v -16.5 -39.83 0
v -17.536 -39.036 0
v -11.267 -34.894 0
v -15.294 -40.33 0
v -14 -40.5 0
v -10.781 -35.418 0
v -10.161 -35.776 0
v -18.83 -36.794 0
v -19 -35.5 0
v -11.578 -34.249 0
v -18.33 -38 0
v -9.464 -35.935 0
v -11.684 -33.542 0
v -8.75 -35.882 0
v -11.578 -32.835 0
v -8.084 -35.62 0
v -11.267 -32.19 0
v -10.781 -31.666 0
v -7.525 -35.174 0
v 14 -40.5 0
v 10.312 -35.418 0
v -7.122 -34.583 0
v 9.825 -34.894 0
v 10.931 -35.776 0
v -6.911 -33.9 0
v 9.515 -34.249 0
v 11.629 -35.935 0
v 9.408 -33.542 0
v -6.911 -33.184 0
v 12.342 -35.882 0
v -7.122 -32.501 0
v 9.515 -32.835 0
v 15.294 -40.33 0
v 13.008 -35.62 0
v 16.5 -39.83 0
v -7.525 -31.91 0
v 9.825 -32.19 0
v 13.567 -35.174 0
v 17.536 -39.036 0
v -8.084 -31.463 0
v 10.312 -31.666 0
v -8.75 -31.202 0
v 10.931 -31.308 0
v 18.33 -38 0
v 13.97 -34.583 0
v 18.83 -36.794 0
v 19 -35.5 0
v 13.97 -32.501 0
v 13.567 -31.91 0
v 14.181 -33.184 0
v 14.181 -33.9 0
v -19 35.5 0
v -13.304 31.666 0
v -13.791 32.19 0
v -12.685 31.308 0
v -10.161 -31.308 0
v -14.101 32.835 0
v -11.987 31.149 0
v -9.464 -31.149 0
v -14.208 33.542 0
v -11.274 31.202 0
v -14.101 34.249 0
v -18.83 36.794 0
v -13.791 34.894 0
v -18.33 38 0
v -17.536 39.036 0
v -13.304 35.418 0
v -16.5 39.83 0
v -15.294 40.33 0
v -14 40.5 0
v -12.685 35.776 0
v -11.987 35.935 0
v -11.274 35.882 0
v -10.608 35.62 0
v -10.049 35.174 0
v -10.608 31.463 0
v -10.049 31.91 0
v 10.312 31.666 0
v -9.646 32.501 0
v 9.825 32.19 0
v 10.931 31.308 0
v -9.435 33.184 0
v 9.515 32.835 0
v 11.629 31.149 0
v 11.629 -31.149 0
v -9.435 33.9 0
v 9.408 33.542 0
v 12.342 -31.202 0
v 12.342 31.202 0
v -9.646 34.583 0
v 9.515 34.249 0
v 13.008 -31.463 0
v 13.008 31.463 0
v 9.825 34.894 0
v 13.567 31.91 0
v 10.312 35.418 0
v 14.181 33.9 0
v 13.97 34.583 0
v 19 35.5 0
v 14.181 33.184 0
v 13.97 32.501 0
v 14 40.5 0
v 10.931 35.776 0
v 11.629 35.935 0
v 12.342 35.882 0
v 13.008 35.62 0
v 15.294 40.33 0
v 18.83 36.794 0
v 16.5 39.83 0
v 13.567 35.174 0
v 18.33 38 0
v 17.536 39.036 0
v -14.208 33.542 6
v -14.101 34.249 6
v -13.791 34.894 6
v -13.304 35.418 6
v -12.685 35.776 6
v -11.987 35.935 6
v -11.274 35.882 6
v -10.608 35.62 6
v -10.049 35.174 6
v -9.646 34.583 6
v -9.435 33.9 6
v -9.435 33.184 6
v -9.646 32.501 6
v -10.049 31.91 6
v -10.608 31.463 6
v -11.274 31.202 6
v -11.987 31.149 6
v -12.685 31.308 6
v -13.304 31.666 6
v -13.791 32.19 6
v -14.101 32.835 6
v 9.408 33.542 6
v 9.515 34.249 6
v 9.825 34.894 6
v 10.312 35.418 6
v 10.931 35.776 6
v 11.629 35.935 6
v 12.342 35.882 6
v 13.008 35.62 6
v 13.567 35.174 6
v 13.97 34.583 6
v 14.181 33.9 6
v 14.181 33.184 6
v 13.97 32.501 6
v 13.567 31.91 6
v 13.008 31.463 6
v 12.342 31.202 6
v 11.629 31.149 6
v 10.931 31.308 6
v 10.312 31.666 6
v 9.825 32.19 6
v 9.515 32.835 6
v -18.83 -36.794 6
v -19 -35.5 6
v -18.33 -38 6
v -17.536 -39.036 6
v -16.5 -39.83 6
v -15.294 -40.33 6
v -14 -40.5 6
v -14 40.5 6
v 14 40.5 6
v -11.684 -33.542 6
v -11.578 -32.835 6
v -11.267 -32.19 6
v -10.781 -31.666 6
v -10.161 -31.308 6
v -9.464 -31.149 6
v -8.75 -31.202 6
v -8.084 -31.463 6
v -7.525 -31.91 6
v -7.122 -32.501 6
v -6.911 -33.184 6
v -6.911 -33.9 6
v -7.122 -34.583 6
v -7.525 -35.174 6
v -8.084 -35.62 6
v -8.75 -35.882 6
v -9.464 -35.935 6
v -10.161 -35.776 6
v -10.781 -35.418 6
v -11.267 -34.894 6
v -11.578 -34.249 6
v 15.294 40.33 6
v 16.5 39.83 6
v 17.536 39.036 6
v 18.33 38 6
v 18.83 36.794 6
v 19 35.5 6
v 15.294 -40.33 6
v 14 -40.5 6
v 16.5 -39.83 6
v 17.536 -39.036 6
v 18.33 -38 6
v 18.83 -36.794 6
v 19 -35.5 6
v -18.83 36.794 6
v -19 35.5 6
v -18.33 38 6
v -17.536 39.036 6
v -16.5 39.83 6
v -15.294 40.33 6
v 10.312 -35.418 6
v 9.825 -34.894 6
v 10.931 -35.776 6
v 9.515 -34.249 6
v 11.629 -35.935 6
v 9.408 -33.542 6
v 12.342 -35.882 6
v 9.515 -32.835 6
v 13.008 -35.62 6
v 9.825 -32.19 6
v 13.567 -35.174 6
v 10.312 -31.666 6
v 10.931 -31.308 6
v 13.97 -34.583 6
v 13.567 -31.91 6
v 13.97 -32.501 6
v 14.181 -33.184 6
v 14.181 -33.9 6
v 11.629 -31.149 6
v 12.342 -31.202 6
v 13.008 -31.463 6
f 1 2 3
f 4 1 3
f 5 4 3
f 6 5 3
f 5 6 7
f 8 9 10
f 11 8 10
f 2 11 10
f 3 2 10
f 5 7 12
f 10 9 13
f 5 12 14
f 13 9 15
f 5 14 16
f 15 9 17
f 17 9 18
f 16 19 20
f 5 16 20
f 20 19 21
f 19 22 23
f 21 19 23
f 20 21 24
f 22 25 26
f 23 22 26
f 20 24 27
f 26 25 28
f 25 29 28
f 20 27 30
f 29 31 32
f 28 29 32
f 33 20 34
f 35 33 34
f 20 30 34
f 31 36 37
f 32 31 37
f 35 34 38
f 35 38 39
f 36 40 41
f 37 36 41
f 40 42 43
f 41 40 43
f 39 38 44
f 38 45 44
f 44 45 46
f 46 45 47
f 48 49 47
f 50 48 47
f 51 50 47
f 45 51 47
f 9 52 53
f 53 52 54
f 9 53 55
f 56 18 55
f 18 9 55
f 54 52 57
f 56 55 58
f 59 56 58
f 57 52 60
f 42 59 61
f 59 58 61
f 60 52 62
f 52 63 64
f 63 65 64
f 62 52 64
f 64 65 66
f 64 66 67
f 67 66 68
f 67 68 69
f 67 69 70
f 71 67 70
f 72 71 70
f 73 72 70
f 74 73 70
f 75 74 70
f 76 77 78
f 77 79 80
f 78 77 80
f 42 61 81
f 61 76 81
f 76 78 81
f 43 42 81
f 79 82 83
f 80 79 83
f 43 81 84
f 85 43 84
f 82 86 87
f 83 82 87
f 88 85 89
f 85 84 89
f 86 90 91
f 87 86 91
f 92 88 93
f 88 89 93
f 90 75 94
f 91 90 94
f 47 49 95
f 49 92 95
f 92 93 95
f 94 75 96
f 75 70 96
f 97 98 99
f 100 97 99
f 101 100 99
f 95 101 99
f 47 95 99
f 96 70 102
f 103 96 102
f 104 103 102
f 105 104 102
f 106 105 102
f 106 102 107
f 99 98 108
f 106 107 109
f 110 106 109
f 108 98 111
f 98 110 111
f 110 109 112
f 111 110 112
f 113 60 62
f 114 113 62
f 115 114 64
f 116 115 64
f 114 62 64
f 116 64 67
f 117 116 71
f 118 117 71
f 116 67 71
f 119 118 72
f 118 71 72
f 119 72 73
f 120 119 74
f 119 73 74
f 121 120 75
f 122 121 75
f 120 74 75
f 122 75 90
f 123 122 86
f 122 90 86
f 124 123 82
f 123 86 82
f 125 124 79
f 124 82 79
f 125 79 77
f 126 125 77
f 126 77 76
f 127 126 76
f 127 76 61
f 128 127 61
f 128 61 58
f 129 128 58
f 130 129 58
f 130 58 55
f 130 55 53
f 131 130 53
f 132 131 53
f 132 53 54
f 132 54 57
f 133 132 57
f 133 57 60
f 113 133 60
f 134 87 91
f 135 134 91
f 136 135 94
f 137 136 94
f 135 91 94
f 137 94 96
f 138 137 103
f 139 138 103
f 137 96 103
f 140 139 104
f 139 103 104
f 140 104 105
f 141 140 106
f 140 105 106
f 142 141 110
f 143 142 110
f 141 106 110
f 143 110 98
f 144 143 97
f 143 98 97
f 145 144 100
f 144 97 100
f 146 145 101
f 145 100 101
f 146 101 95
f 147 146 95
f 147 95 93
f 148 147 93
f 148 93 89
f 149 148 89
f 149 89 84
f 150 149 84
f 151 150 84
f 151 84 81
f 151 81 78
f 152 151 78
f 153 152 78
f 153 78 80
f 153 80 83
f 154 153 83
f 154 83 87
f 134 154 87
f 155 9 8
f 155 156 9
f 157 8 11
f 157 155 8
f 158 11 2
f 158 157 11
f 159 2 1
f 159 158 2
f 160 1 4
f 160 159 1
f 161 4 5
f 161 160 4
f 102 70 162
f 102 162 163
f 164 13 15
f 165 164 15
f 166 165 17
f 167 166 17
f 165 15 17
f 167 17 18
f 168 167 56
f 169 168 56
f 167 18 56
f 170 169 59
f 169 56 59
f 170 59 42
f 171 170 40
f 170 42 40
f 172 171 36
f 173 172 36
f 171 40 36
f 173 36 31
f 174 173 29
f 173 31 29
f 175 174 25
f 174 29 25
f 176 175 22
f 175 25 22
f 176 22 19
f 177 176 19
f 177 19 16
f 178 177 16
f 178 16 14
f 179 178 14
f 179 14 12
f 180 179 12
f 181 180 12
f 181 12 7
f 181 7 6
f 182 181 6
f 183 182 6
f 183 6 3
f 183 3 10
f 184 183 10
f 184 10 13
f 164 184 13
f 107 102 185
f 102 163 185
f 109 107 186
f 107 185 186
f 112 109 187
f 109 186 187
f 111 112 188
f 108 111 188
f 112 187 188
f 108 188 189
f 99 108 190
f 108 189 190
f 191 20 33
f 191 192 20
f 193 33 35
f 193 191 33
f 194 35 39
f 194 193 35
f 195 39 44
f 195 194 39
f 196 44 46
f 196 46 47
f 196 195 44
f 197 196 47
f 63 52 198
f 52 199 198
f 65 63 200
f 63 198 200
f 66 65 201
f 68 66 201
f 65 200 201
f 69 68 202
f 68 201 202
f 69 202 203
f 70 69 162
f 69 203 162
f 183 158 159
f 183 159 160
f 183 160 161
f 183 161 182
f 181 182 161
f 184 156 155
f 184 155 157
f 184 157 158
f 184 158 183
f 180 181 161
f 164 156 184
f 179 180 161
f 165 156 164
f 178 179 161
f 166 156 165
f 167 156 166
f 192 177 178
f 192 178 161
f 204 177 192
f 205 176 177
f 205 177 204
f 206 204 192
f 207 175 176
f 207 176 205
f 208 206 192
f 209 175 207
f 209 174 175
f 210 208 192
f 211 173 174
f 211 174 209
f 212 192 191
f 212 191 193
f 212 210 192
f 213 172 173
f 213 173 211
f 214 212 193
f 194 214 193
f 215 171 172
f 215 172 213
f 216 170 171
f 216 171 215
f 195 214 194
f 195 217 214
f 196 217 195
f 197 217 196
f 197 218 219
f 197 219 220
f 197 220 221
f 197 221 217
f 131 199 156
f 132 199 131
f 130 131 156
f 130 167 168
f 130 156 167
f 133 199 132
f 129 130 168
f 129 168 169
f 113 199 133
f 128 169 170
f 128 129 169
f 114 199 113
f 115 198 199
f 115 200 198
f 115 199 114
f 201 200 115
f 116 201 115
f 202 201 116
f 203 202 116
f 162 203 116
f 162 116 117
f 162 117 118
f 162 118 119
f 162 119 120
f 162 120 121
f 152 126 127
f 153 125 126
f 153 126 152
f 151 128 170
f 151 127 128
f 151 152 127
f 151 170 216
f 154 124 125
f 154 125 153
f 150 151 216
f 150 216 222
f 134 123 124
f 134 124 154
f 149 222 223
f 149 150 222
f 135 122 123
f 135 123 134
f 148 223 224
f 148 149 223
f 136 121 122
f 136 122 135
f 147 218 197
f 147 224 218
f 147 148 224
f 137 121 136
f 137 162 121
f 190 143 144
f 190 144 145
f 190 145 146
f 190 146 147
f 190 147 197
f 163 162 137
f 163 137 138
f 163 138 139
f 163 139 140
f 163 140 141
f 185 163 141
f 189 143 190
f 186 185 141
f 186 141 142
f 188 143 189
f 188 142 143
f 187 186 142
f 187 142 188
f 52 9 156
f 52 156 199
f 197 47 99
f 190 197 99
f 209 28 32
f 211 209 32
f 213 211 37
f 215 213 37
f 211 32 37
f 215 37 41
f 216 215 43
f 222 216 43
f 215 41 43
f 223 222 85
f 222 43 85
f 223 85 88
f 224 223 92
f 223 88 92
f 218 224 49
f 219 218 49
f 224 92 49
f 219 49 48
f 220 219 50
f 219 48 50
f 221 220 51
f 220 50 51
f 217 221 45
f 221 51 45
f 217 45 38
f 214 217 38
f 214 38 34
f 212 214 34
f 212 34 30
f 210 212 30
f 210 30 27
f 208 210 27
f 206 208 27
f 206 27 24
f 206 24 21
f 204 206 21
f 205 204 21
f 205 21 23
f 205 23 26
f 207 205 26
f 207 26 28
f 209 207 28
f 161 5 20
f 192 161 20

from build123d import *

# Parameters (mm, degrees)
SKETCH1_W            = 38
SKETCH1_H            = 81
BOSS_EXTRUDE1_DEPTH  = 6
M4_CLEARANCE_HOLE1_D = 4.8
FILLET1_R            = 5


with BuildPart() as part:
    # Sketch1 → Boss-Extrude1 (new body)
    with BuildSketch(Plane.XY):
        Rectangle(SKETCH1_W, SKETCH1_H)
    extrude(amount=BOSS_EXTRUDE1_DEPTH)

    # M4 Clearance Hole1 (through all)
    with Locations(Plane.XY.offset(6)):
        with Locations((-11.80805, 33.54195), (11.80805, 33.54195), (11.80805, -33.54195), (-9.28425, -33.54195)):
            Hole(M4_CLEARANCE_HOLE1_D / 2)

    # Fillet1
    fillet1_edges = [part.edges().sort_by_distance(p)[0] for p in [
        (19, -40.5, 3),
        (-19, -40.5, 3),
        (-19, 40.5, 3),
        (19, 40.5, 3),
    ]]
    fillet(fillet1_edges, radius=FILLET1_R)


solid = part.part
